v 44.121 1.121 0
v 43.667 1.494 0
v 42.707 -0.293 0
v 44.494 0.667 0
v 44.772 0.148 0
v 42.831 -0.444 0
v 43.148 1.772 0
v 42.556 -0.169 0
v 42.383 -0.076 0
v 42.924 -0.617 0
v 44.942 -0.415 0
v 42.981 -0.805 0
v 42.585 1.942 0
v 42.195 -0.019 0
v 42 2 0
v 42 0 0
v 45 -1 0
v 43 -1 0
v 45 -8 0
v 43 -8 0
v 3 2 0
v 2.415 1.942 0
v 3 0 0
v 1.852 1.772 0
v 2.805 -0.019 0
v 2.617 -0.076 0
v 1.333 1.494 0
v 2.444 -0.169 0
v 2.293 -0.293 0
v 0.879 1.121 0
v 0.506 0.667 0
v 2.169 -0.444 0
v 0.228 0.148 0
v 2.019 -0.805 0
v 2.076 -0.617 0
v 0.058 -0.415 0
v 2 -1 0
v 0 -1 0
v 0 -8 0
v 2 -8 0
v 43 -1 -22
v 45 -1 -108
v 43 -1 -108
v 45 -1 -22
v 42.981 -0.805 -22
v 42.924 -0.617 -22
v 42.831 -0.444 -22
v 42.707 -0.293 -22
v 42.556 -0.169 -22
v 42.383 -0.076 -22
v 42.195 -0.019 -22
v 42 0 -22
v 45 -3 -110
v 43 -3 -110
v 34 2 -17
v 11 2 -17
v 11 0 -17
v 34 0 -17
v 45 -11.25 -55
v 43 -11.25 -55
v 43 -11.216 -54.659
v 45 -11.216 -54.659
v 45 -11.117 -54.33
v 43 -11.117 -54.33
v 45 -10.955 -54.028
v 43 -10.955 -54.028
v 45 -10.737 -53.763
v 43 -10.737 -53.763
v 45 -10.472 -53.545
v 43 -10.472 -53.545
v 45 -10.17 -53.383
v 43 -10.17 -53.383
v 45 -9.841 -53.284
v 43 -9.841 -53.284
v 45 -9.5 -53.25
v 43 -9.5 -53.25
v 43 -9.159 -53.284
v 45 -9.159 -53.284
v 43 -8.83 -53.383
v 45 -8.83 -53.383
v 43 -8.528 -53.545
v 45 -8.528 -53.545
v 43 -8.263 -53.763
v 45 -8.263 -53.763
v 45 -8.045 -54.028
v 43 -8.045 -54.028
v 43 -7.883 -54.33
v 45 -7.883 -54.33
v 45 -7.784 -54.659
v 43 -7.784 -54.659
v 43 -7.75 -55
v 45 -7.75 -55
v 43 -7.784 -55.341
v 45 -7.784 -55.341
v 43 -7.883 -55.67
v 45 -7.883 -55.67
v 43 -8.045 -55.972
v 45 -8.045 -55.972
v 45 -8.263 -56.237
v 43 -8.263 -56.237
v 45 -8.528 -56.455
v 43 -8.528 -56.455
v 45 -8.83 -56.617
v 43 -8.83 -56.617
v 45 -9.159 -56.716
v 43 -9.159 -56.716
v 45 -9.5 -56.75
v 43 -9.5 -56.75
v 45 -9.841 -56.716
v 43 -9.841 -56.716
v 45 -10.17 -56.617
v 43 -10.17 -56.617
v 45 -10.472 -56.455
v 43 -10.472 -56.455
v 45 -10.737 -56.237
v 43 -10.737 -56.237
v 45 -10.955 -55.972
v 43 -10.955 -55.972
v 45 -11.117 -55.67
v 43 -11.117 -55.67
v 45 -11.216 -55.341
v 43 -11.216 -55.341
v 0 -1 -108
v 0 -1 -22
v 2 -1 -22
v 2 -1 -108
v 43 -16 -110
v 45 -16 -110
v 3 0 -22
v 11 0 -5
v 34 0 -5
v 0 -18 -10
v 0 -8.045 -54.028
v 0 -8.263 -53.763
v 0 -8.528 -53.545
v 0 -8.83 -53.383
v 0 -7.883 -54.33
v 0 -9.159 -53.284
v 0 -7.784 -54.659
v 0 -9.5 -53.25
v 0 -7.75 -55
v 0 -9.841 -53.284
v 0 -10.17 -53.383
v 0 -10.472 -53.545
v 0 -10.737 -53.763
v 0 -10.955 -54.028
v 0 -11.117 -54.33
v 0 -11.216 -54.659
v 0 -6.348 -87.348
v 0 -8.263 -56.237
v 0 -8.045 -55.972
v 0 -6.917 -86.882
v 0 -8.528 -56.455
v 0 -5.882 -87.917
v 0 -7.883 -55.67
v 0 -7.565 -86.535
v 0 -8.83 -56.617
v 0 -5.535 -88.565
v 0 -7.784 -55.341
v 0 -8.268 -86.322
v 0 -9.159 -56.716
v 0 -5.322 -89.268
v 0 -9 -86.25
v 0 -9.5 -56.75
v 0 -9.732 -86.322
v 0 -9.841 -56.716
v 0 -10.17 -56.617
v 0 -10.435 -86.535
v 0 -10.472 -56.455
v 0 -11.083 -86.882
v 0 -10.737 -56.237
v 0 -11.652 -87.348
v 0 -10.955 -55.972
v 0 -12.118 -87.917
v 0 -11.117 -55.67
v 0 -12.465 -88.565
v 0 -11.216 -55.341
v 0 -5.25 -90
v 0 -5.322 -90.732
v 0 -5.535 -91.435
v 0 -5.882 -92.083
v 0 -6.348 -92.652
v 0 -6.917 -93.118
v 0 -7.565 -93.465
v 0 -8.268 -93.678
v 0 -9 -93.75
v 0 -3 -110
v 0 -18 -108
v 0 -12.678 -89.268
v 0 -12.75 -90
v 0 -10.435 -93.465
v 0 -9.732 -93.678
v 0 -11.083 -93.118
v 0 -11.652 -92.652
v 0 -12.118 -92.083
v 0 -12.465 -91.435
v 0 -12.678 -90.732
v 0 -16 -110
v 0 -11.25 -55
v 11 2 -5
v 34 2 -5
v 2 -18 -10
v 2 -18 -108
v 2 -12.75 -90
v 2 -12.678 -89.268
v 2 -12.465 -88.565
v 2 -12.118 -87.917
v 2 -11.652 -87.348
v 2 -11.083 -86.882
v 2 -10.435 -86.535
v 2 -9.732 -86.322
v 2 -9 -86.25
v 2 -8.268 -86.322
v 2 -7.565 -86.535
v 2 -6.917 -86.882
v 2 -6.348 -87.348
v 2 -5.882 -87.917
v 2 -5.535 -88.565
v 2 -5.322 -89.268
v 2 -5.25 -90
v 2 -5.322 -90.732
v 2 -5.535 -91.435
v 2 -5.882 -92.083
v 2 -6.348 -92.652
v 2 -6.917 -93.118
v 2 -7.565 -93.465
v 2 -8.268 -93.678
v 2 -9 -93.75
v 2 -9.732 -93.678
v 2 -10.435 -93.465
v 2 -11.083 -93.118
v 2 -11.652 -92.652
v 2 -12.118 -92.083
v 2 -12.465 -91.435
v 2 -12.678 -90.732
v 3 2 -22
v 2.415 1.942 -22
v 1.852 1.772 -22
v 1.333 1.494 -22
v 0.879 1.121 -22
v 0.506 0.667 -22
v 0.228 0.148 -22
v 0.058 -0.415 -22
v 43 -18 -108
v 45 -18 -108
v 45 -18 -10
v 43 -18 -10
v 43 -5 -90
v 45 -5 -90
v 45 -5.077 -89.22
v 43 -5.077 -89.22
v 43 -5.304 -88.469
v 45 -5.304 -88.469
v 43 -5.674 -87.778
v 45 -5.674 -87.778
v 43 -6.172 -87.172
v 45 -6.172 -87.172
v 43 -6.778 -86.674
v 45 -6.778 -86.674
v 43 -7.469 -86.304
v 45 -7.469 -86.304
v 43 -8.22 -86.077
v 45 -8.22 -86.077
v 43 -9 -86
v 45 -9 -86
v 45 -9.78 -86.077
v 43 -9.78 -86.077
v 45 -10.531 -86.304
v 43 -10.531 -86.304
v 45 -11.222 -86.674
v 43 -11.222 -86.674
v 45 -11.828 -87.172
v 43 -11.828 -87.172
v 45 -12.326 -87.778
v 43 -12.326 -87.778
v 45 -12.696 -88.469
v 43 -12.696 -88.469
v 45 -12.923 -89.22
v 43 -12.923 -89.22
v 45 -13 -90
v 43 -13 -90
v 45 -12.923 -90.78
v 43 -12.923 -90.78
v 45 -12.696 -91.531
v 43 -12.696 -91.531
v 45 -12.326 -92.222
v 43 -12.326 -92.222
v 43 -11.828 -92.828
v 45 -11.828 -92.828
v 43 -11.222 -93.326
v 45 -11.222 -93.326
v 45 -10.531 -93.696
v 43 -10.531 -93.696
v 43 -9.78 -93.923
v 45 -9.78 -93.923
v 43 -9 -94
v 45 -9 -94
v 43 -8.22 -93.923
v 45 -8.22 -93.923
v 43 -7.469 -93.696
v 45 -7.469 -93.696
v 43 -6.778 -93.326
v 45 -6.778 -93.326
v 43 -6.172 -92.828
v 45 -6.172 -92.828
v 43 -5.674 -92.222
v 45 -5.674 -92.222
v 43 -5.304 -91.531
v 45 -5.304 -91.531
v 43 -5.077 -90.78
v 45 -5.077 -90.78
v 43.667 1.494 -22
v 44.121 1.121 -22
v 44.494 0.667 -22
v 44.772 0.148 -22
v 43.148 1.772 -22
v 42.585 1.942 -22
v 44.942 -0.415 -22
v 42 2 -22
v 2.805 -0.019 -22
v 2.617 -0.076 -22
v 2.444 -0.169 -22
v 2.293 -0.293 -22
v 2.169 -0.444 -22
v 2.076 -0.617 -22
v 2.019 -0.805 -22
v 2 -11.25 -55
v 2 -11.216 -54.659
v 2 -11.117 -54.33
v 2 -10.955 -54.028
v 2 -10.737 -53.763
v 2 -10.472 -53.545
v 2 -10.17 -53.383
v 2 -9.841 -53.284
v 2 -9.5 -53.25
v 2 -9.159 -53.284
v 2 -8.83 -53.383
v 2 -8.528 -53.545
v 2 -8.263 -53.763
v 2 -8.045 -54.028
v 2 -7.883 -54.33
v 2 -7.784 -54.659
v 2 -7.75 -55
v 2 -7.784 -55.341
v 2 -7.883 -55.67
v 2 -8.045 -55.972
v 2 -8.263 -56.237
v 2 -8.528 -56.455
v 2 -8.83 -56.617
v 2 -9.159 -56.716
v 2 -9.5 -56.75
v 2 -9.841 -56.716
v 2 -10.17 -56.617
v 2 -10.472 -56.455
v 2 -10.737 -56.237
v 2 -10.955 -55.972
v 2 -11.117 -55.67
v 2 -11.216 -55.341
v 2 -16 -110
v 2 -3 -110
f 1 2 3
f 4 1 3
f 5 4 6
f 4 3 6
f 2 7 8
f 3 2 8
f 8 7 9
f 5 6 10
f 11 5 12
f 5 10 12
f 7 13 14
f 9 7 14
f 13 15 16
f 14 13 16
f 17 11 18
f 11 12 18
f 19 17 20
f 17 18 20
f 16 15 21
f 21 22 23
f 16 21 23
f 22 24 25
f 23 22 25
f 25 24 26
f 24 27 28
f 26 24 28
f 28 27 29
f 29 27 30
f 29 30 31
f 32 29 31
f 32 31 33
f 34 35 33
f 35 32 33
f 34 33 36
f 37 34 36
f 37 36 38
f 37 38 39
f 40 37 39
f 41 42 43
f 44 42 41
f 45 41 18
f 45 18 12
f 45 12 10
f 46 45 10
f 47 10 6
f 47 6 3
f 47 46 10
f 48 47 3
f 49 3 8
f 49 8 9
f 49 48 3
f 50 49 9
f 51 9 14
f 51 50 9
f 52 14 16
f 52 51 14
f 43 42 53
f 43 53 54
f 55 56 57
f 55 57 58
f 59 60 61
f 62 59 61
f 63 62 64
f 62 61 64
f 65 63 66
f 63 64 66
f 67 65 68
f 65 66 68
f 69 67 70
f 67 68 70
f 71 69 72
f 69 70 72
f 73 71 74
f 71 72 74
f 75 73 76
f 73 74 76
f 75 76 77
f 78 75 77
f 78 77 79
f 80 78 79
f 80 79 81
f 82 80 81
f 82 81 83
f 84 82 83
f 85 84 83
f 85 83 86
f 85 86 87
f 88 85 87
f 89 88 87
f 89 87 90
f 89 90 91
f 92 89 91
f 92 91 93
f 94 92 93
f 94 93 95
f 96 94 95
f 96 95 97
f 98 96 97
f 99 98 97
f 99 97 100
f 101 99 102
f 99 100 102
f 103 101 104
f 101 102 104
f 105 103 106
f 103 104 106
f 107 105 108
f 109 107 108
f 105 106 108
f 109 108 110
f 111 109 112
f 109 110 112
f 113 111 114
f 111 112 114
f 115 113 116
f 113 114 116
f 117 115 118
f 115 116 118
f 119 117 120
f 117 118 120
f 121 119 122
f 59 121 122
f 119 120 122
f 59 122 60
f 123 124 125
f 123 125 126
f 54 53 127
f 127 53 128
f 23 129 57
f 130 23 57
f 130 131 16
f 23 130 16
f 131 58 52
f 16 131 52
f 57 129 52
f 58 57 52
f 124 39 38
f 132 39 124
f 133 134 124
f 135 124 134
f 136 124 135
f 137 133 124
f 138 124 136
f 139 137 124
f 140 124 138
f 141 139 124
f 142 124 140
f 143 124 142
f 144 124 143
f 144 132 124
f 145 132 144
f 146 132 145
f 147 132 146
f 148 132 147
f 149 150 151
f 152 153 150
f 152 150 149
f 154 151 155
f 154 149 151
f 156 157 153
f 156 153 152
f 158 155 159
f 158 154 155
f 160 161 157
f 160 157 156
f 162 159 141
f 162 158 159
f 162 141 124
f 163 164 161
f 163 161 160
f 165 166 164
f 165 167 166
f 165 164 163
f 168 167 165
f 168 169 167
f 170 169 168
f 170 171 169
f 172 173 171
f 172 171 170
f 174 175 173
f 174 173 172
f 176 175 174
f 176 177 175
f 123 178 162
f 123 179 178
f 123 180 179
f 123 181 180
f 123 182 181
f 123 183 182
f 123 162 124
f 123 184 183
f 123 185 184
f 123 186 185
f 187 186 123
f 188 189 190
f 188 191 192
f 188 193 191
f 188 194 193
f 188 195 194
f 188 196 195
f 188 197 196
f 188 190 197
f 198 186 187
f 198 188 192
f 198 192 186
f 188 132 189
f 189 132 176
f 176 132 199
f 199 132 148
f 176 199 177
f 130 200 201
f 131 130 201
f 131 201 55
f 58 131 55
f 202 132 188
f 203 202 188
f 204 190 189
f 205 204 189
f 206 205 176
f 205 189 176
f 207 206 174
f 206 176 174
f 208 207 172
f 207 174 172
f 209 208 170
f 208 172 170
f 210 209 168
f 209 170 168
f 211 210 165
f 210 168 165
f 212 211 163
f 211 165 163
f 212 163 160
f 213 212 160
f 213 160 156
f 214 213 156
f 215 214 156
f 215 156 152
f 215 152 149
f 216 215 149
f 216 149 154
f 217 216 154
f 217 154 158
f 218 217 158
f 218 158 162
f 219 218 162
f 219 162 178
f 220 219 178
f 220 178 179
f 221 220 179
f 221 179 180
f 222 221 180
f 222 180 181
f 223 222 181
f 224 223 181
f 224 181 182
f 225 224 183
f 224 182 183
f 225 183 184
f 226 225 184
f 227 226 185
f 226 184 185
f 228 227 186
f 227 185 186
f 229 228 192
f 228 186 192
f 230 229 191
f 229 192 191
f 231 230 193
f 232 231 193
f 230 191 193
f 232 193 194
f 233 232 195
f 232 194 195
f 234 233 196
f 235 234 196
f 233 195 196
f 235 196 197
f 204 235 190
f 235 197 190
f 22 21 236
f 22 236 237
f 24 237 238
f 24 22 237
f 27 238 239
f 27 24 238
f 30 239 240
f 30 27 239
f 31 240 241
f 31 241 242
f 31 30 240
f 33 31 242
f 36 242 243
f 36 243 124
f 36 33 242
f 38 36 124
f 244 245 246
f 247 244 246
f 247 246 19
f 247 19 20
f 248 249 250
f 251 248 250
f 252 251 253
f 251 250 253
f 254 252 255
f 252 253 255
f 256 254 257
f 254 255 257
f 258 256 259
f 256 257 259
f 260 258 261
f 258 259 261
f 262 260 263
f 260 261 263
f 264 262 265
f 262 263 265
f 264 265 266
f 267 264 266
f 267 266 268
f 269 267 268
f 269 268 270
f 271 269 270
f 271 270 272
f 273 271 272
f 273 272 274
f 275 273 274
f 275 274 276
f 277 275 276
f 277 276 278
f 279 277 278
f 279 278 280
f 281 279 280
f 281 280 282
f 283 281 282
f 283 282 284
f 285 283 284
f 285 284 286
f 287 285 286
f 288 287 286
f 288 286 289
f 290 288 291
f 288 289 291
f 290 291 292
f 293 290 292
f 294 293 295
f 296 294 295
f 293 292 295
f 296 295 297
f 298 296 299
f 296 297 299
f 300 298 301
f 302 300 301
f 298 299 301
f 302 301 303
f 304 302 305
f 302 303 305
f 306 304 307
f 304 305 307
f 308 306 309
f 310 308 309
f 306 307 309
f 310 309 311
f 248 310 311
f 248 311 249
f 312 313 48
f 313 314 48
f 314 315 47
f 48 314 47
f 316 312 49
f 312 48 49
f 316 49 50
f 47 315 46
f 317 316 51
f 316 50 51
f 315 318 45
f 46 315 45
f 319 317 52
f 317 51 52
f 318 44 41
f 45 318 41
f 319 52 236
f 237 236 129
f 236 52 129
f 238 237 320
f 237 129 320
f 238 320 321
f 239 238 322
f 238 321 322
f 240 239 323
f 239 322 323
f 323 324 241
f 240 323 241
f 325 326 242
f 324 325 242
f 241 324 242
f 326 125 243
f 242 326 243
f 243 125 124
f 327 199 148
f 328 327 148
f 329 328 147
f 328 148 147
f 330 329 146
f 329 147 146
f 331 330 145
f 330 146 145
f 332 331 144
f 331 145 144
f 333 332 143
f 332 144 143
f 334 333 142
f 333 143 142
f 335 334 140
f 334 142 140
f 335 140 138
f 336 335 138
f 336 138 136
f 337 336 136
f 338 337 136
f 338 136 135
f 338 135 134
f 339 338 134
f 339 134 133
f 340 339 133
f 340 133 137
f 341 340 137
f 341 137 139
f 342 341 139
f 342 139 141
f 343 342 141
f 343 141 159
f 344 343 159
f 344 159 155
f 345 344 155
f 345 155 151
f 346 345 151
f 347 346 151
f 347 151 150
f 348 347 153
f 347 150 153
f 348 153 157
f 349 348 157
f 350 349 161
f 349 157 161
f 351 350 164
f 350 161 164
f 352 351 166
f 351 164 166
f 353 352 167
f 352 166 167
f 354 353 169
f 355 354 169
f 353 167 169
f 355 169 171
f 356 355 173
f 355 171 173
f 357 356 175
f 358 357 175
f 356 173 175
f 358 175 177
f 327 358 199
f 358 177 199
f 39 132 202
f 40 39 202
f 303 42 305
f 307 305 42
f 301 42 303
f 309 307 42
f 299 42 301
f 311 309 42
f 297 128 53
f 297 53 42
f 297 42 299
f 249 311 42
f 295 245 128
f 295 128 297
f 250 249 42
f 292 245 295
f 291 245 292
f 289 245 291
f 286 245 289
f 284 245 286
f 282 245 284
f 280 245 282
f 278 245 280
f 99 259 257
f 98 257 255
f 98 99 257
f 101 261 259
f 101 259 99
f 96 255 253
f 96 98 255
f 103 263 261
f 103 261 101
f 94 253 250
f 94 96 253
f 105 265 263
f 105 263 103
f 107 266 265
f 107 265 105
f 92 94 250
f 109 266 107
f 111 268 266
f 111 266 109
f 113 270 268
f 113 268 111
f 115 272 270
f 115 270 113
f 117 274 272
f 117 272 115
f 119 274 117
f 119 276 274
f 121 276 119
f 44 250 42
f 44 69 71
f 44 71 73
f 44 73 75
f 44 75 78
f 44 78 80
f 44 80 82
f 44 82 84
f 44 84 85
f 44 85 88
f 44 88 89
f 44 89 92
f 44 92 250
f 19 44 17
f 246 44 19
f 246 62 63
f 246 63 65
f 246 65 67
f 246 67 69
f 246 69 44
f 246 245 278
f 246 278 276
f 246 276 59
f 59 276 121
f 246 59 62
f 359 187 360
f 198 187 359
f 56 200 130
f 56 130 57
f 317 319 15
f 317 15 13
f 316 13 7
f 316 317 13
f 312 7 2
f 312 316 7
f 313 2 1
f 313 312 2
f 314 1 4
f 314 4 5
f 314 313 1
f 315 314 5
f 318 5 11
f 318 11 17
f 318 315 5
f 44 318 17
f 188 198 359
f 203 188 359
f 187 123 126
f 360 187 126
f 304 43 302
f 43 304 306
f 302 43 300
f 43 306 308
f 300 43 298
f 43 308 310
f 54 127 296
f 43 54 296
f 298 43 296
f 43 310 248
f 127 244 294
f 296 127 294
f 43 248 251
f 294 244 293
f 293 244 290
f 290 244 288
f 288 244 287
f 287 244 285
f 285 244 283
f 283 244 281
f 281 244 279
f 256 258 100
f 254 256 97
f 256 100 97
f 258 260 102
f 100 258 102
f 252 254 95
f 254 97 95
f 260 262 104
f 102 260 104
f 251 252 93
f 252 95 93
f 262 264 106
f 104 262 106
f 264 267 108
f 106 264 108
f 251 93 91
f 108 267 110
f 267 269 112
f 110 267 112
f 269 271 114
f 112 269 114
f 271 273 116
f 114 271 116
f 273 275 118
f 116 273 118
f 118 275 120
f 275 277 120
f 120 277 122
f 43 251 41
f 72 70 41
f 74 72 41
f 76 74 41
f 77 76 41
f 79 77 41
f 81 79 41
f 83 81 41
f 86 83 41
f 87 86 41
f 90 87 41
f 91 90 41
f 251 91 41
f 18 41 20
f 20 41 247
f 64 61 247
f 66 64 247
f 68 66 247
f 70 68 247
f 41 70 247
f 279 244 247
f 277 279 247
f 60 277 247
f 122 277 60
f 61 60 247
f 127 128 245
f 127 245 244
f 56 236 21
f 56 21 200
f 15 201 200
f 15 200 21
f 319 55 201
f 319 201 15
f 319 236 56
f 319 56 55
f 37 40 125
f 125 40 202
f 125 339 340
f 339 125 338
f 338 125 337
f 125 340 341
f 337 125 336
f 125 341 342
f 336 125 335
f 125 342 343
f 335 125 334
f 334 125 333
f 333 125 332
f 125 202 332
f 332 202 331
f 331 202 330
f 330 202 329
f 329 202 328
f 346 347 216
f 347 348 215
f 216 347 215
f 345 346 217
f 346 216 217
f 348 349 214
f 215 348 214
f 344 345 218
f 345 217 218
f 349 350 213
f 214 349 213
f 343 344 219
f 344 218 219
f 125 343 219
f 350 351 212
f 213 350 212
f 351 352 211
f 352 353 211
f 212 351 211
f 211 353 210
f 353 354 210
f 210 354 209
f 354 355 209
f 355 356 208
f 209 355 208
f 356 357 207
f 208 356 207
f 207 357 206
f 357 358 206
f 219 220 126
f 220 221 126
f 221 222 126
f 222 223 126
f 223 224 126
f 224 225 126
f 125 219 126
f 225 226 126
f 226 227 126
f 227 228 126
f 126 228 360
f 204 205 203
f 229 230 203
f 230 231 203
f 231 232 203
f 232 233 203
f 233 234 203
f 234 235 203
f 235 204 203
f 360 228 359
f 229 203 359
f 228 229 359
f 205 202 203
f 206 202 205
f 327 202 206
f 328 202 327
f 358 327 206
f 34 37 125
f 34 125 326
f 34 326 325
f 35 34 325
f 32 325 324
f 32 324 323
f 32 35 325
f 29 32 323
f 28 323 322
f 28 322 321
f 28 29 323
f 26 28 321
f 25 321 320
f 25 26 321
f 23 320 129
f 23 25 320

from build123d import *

# Parameters (mm, degrees)
SKETCH1_W                      = 45
SKETCH1_H                      = 22
BASE_FLANGE1_DEPTH             = 2
EDGE_FLANGE3_STRIP_W           = 10
EDGE_FLANGE3_STRIP_H           = 2
EDGE_FLANGE3_STRIP_CUT_DEPTH   = 22
EDGE_FLANGE3_STRIP_2_W         = 10
EDGE_FLANGE3_STRIP_2_H         = 2
EDGE_FLANGE3_STRIP_CUT_2_DEPTH = 22
EDGE_FLANGE3_DEPTH             = 22
EDGE_FLANGE3_PROFILE_W         = 110
EDGE_FLANGE3_PROFILE_H         = 17
EDGE_FLANGE3_FLAT_DEPTH        = 2
EDGE_FLANGE3_BEND_DEPTH        = 22
EDGE_FLANGE3_PROFILE_2_W       = 110
EDGE_FLANGE3_PROFILE_2_H       = 17
EDGE_FLANGE3_FLAT_2_DEPTH      = 2
SKETCH34_R                     = 4
CUT_EXTRUDE1_DEPTH             = 10
SKETCH35_R                     = 3.75
CUT_EXTRUDE2_DEPTH             = 10
SKETCH36_R                     = 1.75
CUT_EXTRUDE3_DEPTH             = 121.203993278
SKETCH37_W                     = 23
SKETCH37_H                     = 12
CUT_EXTRUDE4_DEPTH             = 10
CHAMFER1_SIZE                  = 2
CHAMFER2_SIZE                  = 10


# Sheet-metal steps are written as plain solids
with BuildPart() as part:
    # Sketch1 → Base-Flange1 (new body)
    with BuildSketch(Plane(origin=(0, 0, 0), x_dir=(1, 0, 0), z_dir=(0, 1, 0))):
        with Locations((22.5, 11)):
            Rectangle(SKETCH1_W, SKETCH1_H)
    extrude(amount=BASE_FLANGE1_DEPTH)

    # Edge-Flange3 strip (across the edge) → Edge-Flange3 strip cut (cut)
    with BuildSketch(Plane(origin=(45, 0, -22), x_dir=(-1, 0, 0), z_dir=(0, 0, 1))):
        with Locations((-2, -1)):
            Rectangle(EDGE_FLANGE3_STRIP_W, EDGE_FLANGE3_STRIP_H)
    extrude(amount=EDGE_FLANGE3_STRIP_CUT_DEPTH, mode=Mode.SUBTRACT)

    # Edge-Flange3 strip 2 (across the edge) → Edge-Flange3 strip cut 2 (cut)
    with BuildSketch(Plane(origin=(0, 0, 0), x_dir=(1, 0, 0), z_dir=(0, 0, -1))):
        with Locations((-2, -1)):
            Rectangle(EDGE_FLANGE3_STRIP_2_W, EDGE_FLANGE3_STRIP_2_H)
    extrude(amount=EDGE_FLANGE3_STRIP_CUT_2_DEPTH, mode=Mode.SUBTRACT)

    # Edge-Flange3 bend section (across the edge) → Edge-Flange3 (add)
    with BuildSketch(Plane(origin=(45, 0, -22), x_dir=(-1, 0, 0), z_dir=(0, 0, 1))):
        with BuildLine():
            Line((0, 1), (2, 1))
            ThreePointArc((2, 1), (2.292893219, 0.292893219), (3, 0))
            Line((3, 0), (3, -2))
            ThreePointArc((3, -2), (0.878679656, -1.121320344), (0, 1))
        make_face()
    extrude(amount=EDGE_FLANGE3_DEPTH)

    # Edge-Flange3 profile (on flange) → Edge-Flange3 flat (add)
    with BuildSketch(Plane(origin=(45, 0, 0), x_dir=(0, 0, 1), z_dir=(1, 0, 0))):
        with Locations((-55, 9.5)):
            Rectangle(EDGE_FLANGE3_PROFILE_W, EDGE_FLANGE3_PROFILE_H)
    extrude(amount=-EDGE_FLANGE3_FLAT_DEPTH)

    # Edge-Flange3 bend section 2 (across the edge) → Edge-Flange3 bend (add)
    with BuildSketch(Plane(origin=(0, 0, 0), x_dir=(1, 0, 0), z_dir=(0, 0, -1))):
        with BuildLine():
            Line((0, 1), (2, 1))
            ThreePointArc((2, 1), (2.292893219, 0.292893219), (3, 0))
            Line((3, 0), (3, -2))
            ThreePointArc((3, -2), (0.878679656, -1.121320344), (0, 1))
        make_face()
    extrude(amount=EDGE_FLANGE3_BEND_DEPTH)

    # Edge-Flange3 profile 2 (on flange) → Edge-Flange3 flat 2 (add)
    with BuildSketch(Plane(origin=(0, 0, 0), x_dir=(0, 0, -1), z_dir=(-1, 0, 0))):
        with Locations((55, 9.5)):
            Rectangle(EDGE_FLANGE3_PROFILE_2_W, EDGE_FLANGE3_PROFILE_2_H)
    extrude(amount=-EDGE_FLANGE3_FLAT_2_DEPTH)

    # Sketch34 → Cut-Extrude1 (cut)
    with BuildSketch(Plane(origin=(45, 0, 0), x_dir=(0, 0, -1), z_dir=(1, 0, 0))):
        with Locations(Location((90, -9, 0), (0, 0, 90))):
            Circle(SKETCH34_R)
    extrude(amount=-CUT_EXTRUDE1_DEPTH, mode=Mode.SUBTRACT)

    # Sketch35 → Cut-Extrude2 (cut)
    with BuildSketch(Plane.ZY):
        with Locations(Location((-90, -9, 0), (0, 0, 270))):
            Circle(SKETCH35_R)
    extrude(amount=-CUT_EXTRUDE2_DEPTH, mode=Mode.SUBTRACT)

    # Sketch36 → Cut-Extrude3 (cut, through all)
    with BuildSketch(Plane.ZY):
        with Locations(Location((-55, -9.5, 0), (0, 0, 270))):
            Circle(SKETCH36_R)
    extrude(amount=-CUT_EXTRUDE3_DEPTH, mode=Mode.SUBTRACT)

    # Sketch37 → Cut-Extrude4 (cut)
    with BuildSketch(Plane(origin=(0, 2, 0), x_dir=(1, 0, 0), z_dir=(0, 1, 0))):
        with Locations((22.5, 11)):
            Rectangle(SKETCH37_W, SKETCH37_H)
    extrude(amount=-CUT_EXTRUDE4_DEPTH, mode=Mode.SUBTRACT)

    # Chamfer1
    chamfer1_edges = [part.edges().sort_by_distance(p)[0] for p in [
        (44, -1, -110),
        (44, -18, -110),
        (1, -1, -110),
        (1, -18, -110),
    ]]
    chamfer(chamfer1_edges, length=CHAMFER1_SIZE)

    # Chamfer2
    chamfer2_edges = [part.edges().sort_by_distance(p)[0] for p in [
        (44, -18, 0),
        (1, -18, 0),
    ]]
    chamfer(chamfer2_edges, length=CHAMFER2_SIZE)


solid = part.part
